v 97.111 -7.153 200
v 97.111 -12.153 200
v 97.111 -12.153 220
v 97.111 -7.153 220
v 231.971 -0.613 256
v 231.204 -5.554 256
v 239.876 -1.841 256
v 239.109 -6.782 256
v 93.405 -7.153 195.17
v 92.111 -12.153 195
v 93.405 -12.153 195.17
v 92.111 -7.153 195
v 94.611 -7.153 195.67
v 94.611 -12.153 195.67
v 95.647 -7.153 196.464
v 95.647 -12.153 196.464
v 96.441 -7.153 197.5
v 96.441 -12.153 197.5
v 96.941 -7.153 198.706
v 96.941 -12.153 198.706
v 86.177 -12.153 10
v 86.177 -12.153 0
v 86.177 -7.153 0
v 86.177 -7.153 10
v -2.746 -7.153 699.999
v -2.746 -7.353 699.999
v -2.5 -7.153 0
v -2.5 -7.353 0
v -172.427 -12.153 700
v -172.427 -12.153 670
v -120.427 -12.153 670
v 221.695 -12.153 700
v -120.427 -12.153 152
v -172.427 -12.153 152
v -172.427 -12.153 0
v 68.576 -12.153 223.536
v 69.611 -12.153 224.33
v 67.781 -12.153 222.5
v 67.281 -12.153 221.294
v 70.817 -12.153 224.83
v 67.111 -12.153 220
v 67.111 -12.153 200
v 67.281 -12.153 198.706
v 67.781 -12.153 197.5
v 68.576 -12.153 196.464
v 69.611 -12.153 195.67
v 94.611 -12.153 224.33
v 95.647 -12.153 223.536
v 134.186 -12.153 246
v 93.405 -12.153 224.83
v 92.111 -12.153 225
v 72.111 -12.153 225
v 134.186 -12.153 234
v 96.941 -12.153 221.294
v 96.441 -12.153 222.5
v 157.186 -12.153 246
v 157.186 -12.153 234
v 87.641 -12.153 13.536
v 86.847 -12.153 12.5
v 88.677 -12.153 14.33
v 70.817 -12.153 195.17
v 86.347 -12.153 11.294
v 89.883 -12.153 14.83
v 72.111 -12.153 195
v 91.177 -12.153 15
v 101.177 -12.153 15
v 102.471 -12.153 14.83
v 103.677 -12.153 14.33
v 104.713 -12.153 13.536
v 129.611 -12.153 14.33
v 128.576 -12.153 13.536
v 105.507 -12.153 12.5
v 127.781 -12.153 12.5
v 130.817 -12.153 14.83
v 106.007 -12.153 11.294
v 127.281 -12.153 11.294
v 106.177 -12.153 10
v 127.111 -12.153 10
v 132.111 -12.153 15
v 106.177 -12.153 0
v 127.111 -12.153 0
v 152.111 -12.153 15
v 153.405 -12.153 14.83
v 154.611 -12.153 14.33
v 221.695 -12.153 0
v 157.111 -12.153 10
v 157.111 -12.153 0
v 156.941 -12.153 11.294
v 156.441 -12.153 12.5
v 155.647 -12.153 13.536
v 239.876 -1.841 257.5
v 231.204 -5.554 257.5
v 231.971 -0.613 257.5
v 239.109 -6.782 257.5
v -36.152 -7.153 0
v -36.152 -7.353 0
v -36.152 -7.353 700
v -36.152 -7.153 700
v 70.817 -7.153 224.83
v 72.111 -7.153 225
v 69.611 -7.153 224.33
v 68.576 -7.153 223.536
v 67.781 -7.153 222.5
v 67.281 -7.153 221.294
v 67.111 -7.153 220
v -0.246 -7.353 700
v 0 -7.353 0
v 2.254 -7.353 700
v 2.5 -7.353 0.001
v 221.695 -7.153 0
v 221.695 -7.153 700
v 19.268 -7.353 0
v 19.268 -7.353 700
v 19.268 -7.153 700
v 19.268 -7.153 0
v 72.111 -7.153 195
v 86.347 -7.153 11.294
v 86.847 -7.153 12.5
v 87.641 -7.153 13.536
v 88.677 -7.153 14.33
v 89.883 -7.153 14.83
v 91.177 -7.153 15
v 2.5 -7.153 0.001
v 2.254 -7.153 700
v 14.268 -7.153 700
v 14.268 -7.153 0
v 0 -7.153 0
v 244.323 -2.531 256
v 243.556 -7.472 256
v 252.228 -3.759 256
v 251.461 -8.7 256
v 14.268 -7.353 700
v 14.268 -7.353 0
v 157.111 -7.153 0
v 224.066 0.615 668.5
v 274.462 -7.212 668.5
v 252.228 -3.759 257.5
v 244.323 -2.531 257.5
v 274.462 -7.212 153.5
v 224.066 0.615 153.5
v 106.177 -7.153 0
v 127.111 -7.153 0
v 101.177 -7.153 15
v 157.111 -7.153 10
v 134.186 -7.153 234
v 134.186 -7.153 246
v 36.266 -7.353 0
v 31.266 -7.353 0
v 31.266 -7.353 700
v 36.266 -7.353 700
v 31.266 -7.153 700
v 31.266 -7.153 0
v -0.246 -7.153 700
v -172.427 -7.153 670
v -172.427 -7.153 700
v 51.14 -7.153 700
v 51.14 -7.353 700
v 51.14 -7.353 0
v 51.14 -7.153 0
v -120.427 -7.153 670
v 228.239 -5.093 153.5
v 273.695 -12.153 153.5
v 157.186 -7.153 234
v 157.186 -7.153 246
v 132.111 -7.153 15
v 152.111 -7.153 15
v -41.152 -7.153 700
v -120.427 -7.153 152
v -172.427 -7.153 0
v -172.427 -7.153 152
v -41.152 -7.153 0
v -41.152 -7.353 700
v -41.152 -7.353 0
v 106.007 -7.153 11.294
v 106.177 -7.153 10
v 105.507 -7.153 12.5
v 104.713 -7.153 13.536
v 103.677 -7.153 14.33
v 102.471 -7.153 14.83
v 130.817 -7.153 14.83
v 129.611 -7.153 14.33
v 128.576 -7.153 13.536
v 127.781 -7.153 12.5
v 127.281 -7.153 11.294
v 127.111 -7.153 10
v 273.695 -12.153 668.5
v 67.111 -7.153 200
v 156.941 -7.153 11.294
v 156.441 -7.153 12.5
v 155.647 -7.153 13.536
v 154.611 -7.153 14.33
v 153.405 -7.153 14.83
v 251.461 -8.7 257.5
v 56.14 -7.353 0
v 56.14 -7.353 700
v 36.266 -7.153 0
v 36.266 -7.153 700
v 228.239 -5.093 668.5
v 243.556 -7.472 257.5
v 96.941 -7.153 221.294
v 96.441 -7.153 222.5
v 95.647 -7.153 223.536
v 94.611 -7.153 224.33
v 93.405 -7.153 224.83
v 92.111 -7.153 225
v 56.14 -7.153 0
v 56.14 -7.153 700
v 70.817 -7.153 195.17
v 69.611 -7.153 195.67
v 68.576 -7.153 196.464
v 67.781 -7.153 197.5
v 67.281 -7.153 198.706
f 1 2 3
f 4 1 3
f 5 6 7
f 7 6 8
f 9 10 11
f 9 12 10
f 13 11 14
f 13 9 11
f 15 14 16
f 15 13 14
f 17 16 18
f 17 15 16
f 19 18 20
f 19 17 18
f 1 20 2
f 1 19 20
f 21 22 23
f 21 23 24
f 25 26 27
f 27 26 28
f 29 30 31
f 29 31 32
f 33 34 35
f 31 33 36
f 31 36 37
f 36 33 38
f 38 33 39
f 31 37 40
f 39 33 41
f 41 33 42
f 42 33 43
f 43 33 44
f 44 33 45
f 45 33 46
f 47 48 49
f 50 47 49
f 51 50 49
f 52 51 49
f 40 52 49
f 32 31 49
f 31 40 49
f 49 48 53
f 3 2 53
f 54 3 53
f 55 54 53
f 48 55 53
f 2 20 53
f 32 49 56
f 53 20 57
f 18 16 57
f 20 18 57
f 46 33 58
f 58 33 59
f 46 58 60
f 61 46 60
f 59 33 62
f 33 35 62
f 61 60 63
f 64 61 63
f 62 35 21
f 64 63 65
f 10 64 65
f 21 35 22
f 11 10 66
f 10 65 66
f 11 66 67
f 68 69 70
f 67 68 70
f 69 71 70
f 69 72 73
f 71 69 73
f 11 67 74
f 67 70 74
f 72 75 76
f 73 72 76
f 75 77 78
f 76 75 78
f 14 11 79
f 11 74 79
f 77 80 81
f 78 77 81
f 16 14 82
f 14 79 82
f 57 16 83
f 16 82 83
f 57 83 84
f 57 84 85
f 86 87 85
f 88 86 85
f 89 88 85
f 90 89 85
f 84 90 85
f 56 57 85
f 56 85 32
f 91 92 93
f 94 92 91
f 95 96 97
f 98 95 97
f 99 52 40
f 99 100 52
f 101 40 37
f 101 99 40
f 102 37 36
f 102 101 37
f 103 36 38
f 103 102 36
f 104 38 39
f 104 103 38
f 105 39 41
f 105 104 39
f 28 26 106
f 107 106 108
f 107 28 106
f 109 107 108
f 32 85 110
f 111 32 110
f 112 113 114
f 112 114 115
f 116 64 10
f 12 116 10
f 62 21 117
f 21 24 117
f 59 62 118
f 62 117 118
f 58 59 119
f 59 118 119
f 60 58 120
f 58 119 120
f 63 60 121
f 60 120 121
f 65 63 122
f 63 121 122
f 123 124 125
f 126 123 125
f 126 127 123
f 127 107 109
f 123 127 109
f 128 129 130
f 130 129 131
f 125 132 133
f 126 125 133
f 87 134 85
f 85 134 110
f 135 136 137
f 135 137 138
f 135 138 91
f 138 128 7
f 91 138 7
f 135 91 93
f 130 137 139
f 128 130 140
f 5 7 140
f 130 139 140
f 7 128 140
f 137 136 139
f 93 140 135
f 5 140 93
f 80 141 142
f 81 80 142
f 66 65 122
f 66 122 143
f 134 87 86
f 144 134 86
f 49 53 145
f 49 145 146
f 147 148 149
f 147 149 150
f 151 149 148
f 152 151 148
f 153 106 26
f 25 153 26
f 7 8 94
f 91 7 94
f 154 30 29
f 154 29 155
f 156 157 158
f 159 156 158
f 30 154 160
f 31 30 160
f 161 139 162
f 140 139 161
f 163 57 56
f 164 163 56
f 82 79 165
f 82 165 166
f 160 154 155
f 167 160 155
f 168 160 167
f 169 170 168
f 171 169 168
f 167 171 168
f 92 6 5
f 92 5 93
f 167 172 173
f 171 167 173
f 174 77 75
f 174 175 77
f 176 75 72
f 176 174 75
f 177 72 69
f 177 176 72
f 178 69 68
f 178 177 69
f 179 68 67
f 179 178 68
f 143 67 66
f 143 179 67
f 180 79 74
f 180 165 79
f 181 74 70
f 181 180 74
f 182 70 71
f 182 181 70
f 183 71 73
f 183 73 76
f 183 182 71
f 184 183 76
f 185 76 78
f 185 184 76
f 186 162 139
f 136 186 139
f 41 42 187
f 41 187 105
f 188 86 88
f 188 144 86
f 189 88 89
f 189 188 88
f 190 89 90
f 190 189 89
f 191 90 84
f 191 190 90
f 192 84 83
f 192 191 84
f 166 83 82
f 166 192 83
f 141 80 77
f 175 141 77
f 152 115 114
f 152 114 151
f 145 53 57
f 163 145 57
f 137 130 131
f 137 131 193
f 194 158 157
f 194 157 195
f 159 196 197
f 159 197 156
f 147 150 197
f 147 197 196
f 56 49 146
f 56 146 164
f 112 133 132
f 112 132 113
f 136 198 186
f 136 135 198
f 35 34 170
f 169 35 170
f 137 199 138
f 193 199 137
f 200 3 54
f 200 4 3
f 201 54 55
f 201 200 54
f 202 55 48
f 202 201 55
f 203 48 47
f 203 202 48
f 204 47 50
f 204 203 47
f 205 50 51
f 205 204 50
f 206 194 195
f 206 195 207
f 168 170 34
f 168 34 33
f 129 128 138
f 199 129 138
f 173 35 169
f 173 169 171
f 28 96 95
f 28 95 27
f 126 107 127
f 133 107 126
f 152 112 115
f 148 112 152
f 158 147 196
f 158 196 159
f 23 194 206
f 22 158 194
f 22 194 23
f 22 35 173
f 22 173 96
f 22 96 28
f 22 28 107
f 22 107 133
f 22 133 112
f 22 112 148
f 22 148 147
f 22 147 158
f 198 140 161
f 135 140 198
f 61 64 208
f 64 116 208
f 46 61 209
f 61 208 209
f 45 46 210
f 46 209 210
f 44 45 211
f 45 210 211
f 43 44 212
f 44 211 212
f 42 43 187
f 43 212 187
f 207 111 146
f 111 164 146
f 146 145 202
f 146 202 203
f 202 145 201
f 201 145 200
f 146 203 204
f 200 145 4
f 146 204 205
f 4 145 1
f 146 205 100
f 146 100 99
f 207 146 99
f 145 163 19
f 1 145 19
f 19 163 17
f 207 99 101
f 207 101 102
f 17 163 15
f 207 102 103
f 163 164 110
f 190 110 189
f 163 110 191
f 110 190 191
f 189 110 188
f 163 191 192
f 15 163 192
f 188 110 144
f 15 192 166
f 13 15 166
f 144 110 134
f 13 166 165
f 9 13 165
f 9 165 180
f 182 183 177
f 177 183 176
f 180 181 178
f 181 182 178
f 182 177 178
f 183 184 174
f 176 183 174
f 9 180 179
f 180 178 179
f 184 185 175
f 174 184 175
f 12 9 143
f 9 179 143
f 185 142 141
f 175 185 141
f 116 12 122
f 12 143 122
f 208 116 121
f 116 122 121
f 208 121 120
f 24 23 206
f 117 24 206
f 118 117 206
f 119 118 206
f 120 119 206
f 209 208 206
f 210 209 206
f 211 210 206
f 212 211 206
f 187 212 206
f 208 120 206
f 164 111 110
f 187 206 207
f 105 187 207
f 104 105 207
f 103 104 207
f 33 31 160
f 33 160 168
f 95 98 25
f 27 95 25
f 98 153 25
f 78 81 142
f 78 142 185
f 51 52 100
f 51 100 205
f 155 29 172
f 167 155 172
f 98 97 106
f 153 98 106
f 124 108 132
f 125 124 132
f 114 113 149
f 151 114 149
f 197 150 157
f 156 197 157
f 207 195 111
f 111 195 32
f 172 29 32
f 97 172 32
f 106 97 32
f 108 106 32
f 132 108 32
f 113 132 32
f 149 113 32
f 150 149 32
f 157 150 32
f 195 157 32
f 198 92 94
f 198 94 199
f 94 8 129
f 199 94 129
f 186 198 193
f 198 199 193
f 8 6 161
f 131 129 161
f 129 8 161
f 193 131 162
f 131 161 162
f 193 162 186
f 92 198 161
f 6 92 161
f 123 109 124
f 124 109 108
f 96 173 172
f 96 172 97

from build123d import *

# Parameters (mm, degrees)
TRAGFL_CHEGRUNDFORM_DEPTH                    = 700
ABWICKELN1_DEPTH                             = 700
ABWICKELN1_2_DEPTH                           = 700
ABBIEGEN1_DEPTH                              = 700
ABBIEGEN1_2_DEPTH                            = 700
QUERRUDER_DEPTH                              = 5
FASE1_SIZE                                   = 5
SKIZZE9_W                                    = 20
SKIZZE9_H                                    = 15
KABELDURCHBRUCHRUMPF_DEPTH                   = 5
VERRUNDUNG1_R                                = 5
SKIZZE10_W                                   = 30
SKIZZE10_H                                   = 30
KABELDURCHBRUCHMOTOR_DEPTH                   = 5
VERRUNDUNG2_R                                = 5
SKIZZE11_W                                   = 30
SKIZZE11_H                                   = 15
SCHNITT_LINEAR_AUSTRAGEN1_DEPTH              = 5
KABELDURCHBURCHSERVOS_R                      = 5
SKIZZE12_W                                   = 23
SKIZZE12_H                                   = 12
SERVODURCHBRUCH_DEPTH                        = 10
SKIZZE13_W                                   = 8
SKIZZE13_H                                   = 1.5
SCHNITT_LINEAR_AUSTRAGEN2_DEPTH              = 752.378951978
SCHNITT_LINEAR_AUSTRAGEN_D_NN2_DEPTH         = 700
SCHNITT_LINEAR_AUSTRAGEN_D_NN2_2_OUTLINE_W   = 52
SCHNITT_LINEAR_AUSTRAGEN_D_NN2_2_OUTLINE_H   = 5
SCHNITT_LINEAR_AUSTRAGEN_D_NN2_2_DEPTH       = 152
SCHNITT_LINEAR_AUSTRAGEN_D_NN2_START         = 670
SCHNITT_LINEAR_AUSTRAGEN_D_NN2_3_OUTLINE_W   = 52
SCHNITT_LINEAR_AUSTRAGEN_D_NN2_3_OUTLINE_H   = 5
SCHNITT_LINEAR_AUSTRAGEN_D_NN2_3_DEPTH       = 30
SCHNITT_LINEAR_AUSTRAGEN_D_NN2_4_DEPTH       = 700
SCHNITT_LINEAR_AUSTRAGEN_D_NN2_START_2       = -12.152804342
SCHNITT_LINEAR_AUSTRAGEN_D_NN2_5_OUTLINE_W   = 179.426586231
SCHNITT_LINEAR_AUSTRAGEN_D_NN2_5_OUTLINE_H   = 700
SCHNITT_LINEAR_AUSTRAGEN_D_NN2_5_DEPTH       = 4.8
SCHNITT_LINEAR_AUSTRAGEN_D_NN2_START_3       = -7.352804342
SCHNITT_LINEAR_AUSTRAGEN_D_NN2_6_OUTLINE_W   = 79.274946575
SCHNITT_LINEAR_AUSTRAGEN_D_NN2_6_OUTLINE_H   = 700
SCHNITT_LINEAR_AUSTRAGEN_D_NN2_6_OUTLINE_W_2 = 11.998027887
SCHNITT_LINEAR_AUSTRAGEN_D_NN2_6_OUTLINE_W_3 = 14.873170005
SCHNITT_LINEAR_AUSTRAGEN_D_NN2_6_DEPTH       = 0.2


with BuildPart() as part:
    # TragflächeGrundform: read off the stored shape, not the designer's step
    # TragflächeGrundform outline → TragflächeGrundform (new body)
    with BuildSketch(Plane.XY):
        Polygon((141.694514104, 8.347195658), (273.694514104, -12.152804342), (274.46183092, -7.212032651), (142.080458395, 13.347195658), (103.267684057, 13.347195658), (86.110620432, 10.396432289), (69.585407633, 5.027065166), (35.868015254, -12.152804342), (221.694514104, -12.152804342), (221.694514104, -7.152804342), (56.694514104, -7.152804342), (71.504741461, 0.393383409), (87.313114186, 5.529835073), (103.694514104, 8.347195658), align=None)
    extrude(amount=TRAGFL_CHEGRUNDFORM_DEPTH)

    # Abwickeln1: read off the stored shape, not the designer's step
    # Abwickeln1 outline → Abwickeln1 (cut)
    with BuildSketch(Plane.XY):
        Polygon((69.585407633, 5.027065166), (45.681067781, -7.152804342), (56.694514104, -7.152804342), (71.504741461, 0.393383409), (87.313114186, 5.529835073), (103.694514104, 8.347195658), (141.694514104, 8.347195658), (273.694514104, -12.152804342), (274.46183092, -7.212032651), (142.080458395, 13.347195658), (103.267684057, 13.347195658), (86.110620432, 10.396432289), align=None)
    extrude(amount=ABWICKELN1_DEPTH, mode=Mode.SUBTRACT)

    # Abwickeln1 2 outline → Abwickeln1 2 (add)
    with BuildSketch(Plane.XY):
        Polygon((45.681067781, -7.152804342), (-172.426586231, -7.152804342), (-172.426586231, -12.152804342), (35.868015254, -12.152804342), align=None)
    extrude(amount=ABWICKELN1_2_DEPTH)

    # Abbiegen1: read off the stored shape, not the designer's step
    # Abbiegen1 outline → Abbiegen1 (cut)
    with BuildSketch(Plane.XY):
        with BuildLine():
            ThreePointArc((57.111044081, -12.152804342), (53.540329867, -10.694232633), (52.012024567, -7.152804342))
            Line((52.012024567, -7.152804342), (-172.426586231, -7.152804342))
            Line((-172.426586231, -7.152804342), (-172.426586231, -12.152804342))
            Line((-172.426586231, -12.152804342), (57.111044081, -12.152804342))
        make_face()
    extrude(amount=ABBIEGEN1_DEPTH, mode=Mode.SUBTRACT)

    # Abbiegen1 2 outline → Abbiegen1 2 (add)
    with BuildSketch(Plane.XY):
        with BuildLine():
            Line((141.702141554, 8.346011092), (273.694514104, -12.152804342))
            Line((273.694514104, -12.152804342), (274.46183092, -7.212032651))
            Line((274.46183092, -7.212032651), (142.46945837, 13.286782783))
            ThreePointArc((142.46945837, 13.286782783), (142.079290863, 13.332070009), (141.686795218, 13.347195658))
            Line((141.686795218, 13.347195658), (103.703050705, 13.347195658))
            ThreePointArc((103.703050705, 13.347195658), (103.269261775, 13.328713853), (102.838616847, 13.273402389))
            Line((102.838616847, 13.273402389), (86.472730203, 10.45870986))
            ThreePointArc((86.472730203, 10.45870986), (86.113791213, 10.383599863), (85.76117739, 10.282891362))
            Line((85.76117739, 10.282891362), (69.967141466, 5.151098007))
            ThreePointArc((69.967141466, 5.151098007), (69.591442632, 5.01249539), (69.227776589, 4.844843047))
            Line((69.227776589, 4.844843047), (54.795692532, -2.508671069))
            ThreePointArc((54.795692532, -2.508671069), (52.736662064, -4.430823798), (52.012024567, -7.152804342))
            Line((52.012024567, -7.152804342), (57.111044081, -7.152804342))
            ThreePointArc((57.111044081, -7.152804342), (57.013807089, -7.076148878), (57.065645031, -6.963703689))
            Line((57.065645031, -6.963703689), (71.497729087, 0.389810426))
            ThreePointArc((71.497729087, 0.389810426), (71.504859794, 0.393097727), (71.512226438, 0.395815426))
            Line((71.512226438, 0.395815426), (87.306262362, 5.52760878))
            ThreePointArc((87.306262362, 5.52760878), (87.313176358, 5.529583457), (87.320214378, 5.531056202))
            Line((87.320214378, 5.531056202), (103.686101021, 8.345748731))
            ThreePointArc((103.686101021, 8.345748731), (103.694545039, 8.34683327), (103.703050705, 8.347195658))
            Line((103.703050705, 8.347195658), (141.686795218, 8.347195658))
            ThreePointArc((141.686795218, 8.347195658), (141.694491211, 8.346899077), (141.702141554, 8.346011092))
        make_face()
    extrude(amount=ABBIEGEN1_2_DEPTH)

    # Skizze8 → Querruder (cut)
    with BuildSketch(Plane(origin=(5.370179419, 34.578716257, 0), x_dir=(0.9881543382363094, -0.15346336313518455, 0), z_dir=(0.15346336313518455, 0.9881543382363094, 0))):
        Polygon((272.317431689, -670), (220.317431689, -670), (220.317431689, -418.5), (220.317431689, -358.002851525), (220.317431689, -152), (272.317431689, -152), (272.317431689, -153.5), (221.317431689, -153.5), (221.317431689, -668.5), (272.317431689, -668.5), align=None)
    extrude(amount=-QUERRUDER_DEPTH, mode=Mode.SUBTRACT)


with BuildPart() as querruder_piece_1:
    # of the separate pieces the step leaves, piece 1, a body of its own (querruder_pieces)
    add(part.part.solids().sort_by_distance((221.694514104, -12.152804342, 0))[0])

    # Skizze9 → KabeldurchbruchRumpf (cut)
    with BuildSketch(Plane.XZ.offset(12.152804342)):
        with Locations((96.176970849, 7.5)):
            Rectangle(SKIZZE9_W, SKIZZE9_H)
    extrude(amount=-KABELDURCHBRUCHRUMPF_DEPTH, mode=Mode.SUBTRACT)

    # Verrundung1
    verrundung1_edges = [querruder_piece_1.edges().sort_by_distance(p)[0] for p in [
        (86.176970849, -9.652804342, 15),
        (106.176970849, -9.652804342, 15),
    ]]
    fillet(verrundung1_edges, radius=VERRUNDUNG1_R)

    # Skizze10 → KabeldurchbruchMotor (cut)
    with BuildSketch(Plane.XZ.offset(12.152804342)):
        with Locations((82.111044081, 210)):
            Rectangle(SKIZZE10_W, SKIZZE10_H)
    extrude(amount=-KABELDURCHBRUCHMOTOR_DEPTH, mode=Mode.SUBTRACT)

    # Verrundung2
    verrundung2_edges = [querruder_piece_1.edges().sort_by_distance(p)[0] for p in [
        (67.111044081, -9.652804342, 195),
        (67.111044081, -9.652804342, 225),
        (97.111044081, -9.652804342, 225),
        (97.111044081, -9.652804342, 195),
    ]]
    fillet(verrundung2_edges, radius=VERRUNDUNG2_R)

    # Skizze11 → Schnitt-Linear austragen1 (cut)
    with BuildSketch(Plane.XZ.offset(12.152804342)):
        with Locations((142.111044081, 7.5)):
            Rectangle(SKIZZE11_W, SKIZZE11_H)
    extrude(amount=-SCHNITT_LINEAR_AUSTRAGEN1_DEPTH, mode=Mode.SUBTRACT)

    # KabeldurchburchServos
    kabeldurchburchservos_edges = [querruder_piece_1.edges().sort_by_distance(p)[0] for p in [
        (127.111044081, -9.652804342, 15),
        (157.111044081, -9.652804342, 15),
    ]]
    fillet(kabeldurchburchservos_edges, radius=KABELDURCHBURCHSERVOS_R)

    # Skizze12 → ServoDurchbruch (cut)
    with BuildSketch(Plane.XZ.offset(12.152804342)):
        with Locations((145.686101021, 240)):
            Rectangle(SKIZZE12_W, SKIZZE12_H)
    extrude(amount=-SERVODURCHBRUCH_DEPTH, mode=Mode.SUBTRACT)

    # Schnitt-Linear-Austragen-Dünn2: read off the stored shape, not the designer's step
    # Schnitt-Linear-Austragen-Dünn2 outline → Schnitt-Linear-Austragen-Dünn2 (cut)
    with BuildSketch(Plane.XY):
        Polygon((274.46183092, -7.212032651), (223.077805331, 0.768062232), (222.310488516, -4.172709459), (273.694514104, -12.152804342), align=None)
    extrude(amount=SCHNITT_LINEAR_AUSTRAGEN_D_NN2_DEPTH, mode=Mode.SUBTRACT)

    # Schnitt-Linear-Austragen-D_nn2 2 outline → Schnitt-Linear-Austragen-D_nn2 2 (add)
    with BuildSketch(Plane.XY):
        with Locations((-146.426586231, -9.652804342)):
            Rectangle(SCHNITT_LINEAR_AUSTRAGEN_D_NN2_2_OUTLINE_W, SCHNITT_LINEAR_AUSTRAGEN_D_NN2_2_OUTLINE_H)
    extrude(amount=SCHNITT_LINEAR_AUSTRAGEN_D_NN2_2_DEPTH)

    # Schnitt-Linear-Austragen-D_nn2 3 outline → Schnitt-Linear-Austragen-D_nn2 3 (add)
    with BuildSketch(Plane.XY.offset(SCHNITT_LINEAR_AUSTRAGEN_D_NN2_START)):
        with Locations((-146.426586231, -9.652804342)):
            Rectangle(SCHNITT_LINEAR_AUSTRAGEN_D_NN2_3_OUTLINE_W, SCHNITT_LINEAR_AUSTRAGEN_D_NN2_3_OUTLINE_H)
    extrude(amount=SCHNITT_LINEAR_AUSTRAGEN_D_NN2_3_DEPTH)

    # Schnitt-Linear-Austragen-D_nn2 4 outline → Schnitt-Linear-Austragen-D_nn2 4 (cut)
    with BuildSketch(Plane.XY):
        with BuildLine():
            ThreePointArc((54.795692532, -2.508671069), (52.686053369, -4.517166908), (52.019875256, -7.352804342))
            Line((52.019875256, -7.352804342), (56.139584199, -7.352804342))
            Line((56.139584199, -7.352804342), (56.139584199, -7.152804342))
            Line((56.139584199, -7.152804342), (57.111044081, -7.152804342))
            ThreePointArc((57.111044081, -7.152804342), (57.013807089, -7.076148878), (57.065645031, -6.963703689))
            Line((57.065645031, -6.963703689), (71.497729087, 0.389810426))
            ThreePointArc((71.497729087, 0.389810426), (71.504859794, 0.393097727), (71.512226438, 0.395815426))
            Line((71.512226438, 0.395815426), (87.306262362, 5.52760878))
            ThreePointArc((87.306262362, 5.52760878), (87.313176358, 5.529583457), (87.320214378, 5.531056202))
            Line((87.320214378, 5.531056202), (103.686101021, 8.345748731))
            ThreePointArc((103.686101021, 8.345748731), (103.694545039, 8.34683327), (103.703050705, 8.347195658))
            Line((103.703050705, 8.347195658), (141.686795218, 8.347195658))
            ThreePointArc((141.686795218, 8.347195658), (141.694491211, 8.346899077), (141.702141554, 8.346011092))
            Line((141.702141554, 8.346011092), (222.310488516, -4.172709459))
            Line((222.310488516, -4.172709459), (223.077805331, 0.768062232))
            Line((223.077805331, 0.768062232), (142.46945837, 13.286782783))
            ThreePointArc((142.46945837, 13.286782783), (142.079290863, 13.332070009), (141.686795218, 13.347195658))
            Line((141.686795218, 13.347195658), (103.703050705, 13.347195658))
            ThreePointArc((103.703050705, 13.347195658), (103.269261775, 13.328713853), (102.838616847, 13.273402389))
            Line((102.838616847, 13.273402389), (86.472730203, 10.45870986))
            ThreePointArc((86.472730203, 10.45870986), (86.113791213, 10.383599863), (85.76117739, 10.282891362))
            Line((85.76117739, 10.282891362), (69.967141466, 5.151098007))
            ThreePointArc((69.967141466, 5.151098007), (69.591442632, 5.01249539), (69.227776589, 4.844843047))
            Line((69.227776589, 4.844843047), (54.795692532, -2.508671069))
        make_face()
    extrude(amount=SCHNITT_LINEAR_AUSTRAGEN_D_NN2_4_DEPTH, mode=Mode.SUBTRACT)

    # Schnitt-Linear-Austragen-D_nn2 5 outline → Schnitt-Linear-Austragen-D_nn2 5 (add)
    with BuildSketch(Plane(origin=(0, 0, 0), x_dir=(1, 0, 0), z_dir=(0, 1, 0)).offset(SCHNITT_LINEAR_AUSTRAGEN_D_NN2_START_2)):
        with Locations((-30.713293115, -350)):
            Rectangle(SCHNITT_LINEAR_AUSTRAGEN_D_NN2_5_OUTLINE_W, SCHNITT_LINEAR_AUSTRAGEN_D_NN2_5_OUTLINE_H)
    extrude(amount=SCHNITT_LINEAR_AUSTRAGEN_D_NN2_5_DEPTH)

    # Schnitt-Linear-Austragen-D_nn2 6 outline → Schnitt-Linear-Austragen-D_nn2 6 (add)
    with BuildSketch(Plane(origin=(0, 0, 0), x_dir=(1, 0, 0), z_dir=(0, 1, 0)).offset(SCHNITT_LINEAR_AUSTRAGEN_D_NN2_START_3)):
        with Locations((-80.789112944, -350)):
            Rectangle(SCHNITT_LINEAR_AUSTRAGEN_D_NN2_6_OUTLINE_W, SCHNITT_LINEAR_AUSTRAGEN_D_NN2_6_OUTLINE_H)
        Polygon((-36.151639656, 0), (-36.151639656, -700), (-0.246186452, -700), (-2.746186296, -699.999120763), (-2.500000155, 0), align=None)
        Polygon((2.499999845, -0.000879237), (2.253813704, -700), (14.268386307, -700), (14.268386307, 0), (-1.26e-07, 0), align=None)
        with Locations((25.267400251, -350)):
            Rectangle(SCHNITT_LINEAR_AUSTRAGEN_D_NN2_6_OUTLINE_W_2, SCHNITT_LINEAR_AUSTRAGEN_D_NN2_6_OUTLINE_H)
        with Locations((43.702999197, -350)):
            Rectangle(SCHNITT_LINEAR_AUSTRAGEN_D_NN2_6_OUTLINE_W_3, SCHNITT_LINEAR_AUSTRAGEN_D_NN2_6_OUTLINE_H)
    extrude(amount=SCHNITT_LINEAR_AUSTRAGEN_D_NN2_6_DEPTH)


with BuildPart() as querruder_piece_2:
    # of the separate pieces the step leaves, piece 2, a body of its own (querruder_pieces)
    add(part.part.solids().sort_by_distance((273.694514104, -12.152804342, 153.5))[0])

    # Fase1
    fase1_edges = [querruder_piece_2.edges().sort_by_distance(p)[0] for p in [
        (223.298642854, -4.326172822, 411),
    ]]
    chamfer(fase1_edges, length=FASE1_SIZE - 0.0001)  # a hair under: the kernel refuses the full size

    # Skizze13 → Schnitt-Linear austragen2 (cut, through all)
    with BuildSketch(Plane(origin=(4.602862603, 29.637944565, 0), x_dir=(0.9881543382363094, -0.15346336313518452, 0), z_dir=(-0.15346336313518452, -0.9881543382363095, 0))):
        with Locations((233.317431689, 256.75)):
            Rectangle(SKIZZE13_W, SKIZZE13_H)
        with Locations((245.817431689, 256.75)):
            Rectangle(SKIZZE13_W, SKIZZE13_H)
    extrude(amount=-SCHNITT_LINEAR_AUSTRAGEN2_DEPTH, mode=Mode.SUBTRACT)


solid = Compound([querruder_piece_1.part, querruder_piece_2.part])
